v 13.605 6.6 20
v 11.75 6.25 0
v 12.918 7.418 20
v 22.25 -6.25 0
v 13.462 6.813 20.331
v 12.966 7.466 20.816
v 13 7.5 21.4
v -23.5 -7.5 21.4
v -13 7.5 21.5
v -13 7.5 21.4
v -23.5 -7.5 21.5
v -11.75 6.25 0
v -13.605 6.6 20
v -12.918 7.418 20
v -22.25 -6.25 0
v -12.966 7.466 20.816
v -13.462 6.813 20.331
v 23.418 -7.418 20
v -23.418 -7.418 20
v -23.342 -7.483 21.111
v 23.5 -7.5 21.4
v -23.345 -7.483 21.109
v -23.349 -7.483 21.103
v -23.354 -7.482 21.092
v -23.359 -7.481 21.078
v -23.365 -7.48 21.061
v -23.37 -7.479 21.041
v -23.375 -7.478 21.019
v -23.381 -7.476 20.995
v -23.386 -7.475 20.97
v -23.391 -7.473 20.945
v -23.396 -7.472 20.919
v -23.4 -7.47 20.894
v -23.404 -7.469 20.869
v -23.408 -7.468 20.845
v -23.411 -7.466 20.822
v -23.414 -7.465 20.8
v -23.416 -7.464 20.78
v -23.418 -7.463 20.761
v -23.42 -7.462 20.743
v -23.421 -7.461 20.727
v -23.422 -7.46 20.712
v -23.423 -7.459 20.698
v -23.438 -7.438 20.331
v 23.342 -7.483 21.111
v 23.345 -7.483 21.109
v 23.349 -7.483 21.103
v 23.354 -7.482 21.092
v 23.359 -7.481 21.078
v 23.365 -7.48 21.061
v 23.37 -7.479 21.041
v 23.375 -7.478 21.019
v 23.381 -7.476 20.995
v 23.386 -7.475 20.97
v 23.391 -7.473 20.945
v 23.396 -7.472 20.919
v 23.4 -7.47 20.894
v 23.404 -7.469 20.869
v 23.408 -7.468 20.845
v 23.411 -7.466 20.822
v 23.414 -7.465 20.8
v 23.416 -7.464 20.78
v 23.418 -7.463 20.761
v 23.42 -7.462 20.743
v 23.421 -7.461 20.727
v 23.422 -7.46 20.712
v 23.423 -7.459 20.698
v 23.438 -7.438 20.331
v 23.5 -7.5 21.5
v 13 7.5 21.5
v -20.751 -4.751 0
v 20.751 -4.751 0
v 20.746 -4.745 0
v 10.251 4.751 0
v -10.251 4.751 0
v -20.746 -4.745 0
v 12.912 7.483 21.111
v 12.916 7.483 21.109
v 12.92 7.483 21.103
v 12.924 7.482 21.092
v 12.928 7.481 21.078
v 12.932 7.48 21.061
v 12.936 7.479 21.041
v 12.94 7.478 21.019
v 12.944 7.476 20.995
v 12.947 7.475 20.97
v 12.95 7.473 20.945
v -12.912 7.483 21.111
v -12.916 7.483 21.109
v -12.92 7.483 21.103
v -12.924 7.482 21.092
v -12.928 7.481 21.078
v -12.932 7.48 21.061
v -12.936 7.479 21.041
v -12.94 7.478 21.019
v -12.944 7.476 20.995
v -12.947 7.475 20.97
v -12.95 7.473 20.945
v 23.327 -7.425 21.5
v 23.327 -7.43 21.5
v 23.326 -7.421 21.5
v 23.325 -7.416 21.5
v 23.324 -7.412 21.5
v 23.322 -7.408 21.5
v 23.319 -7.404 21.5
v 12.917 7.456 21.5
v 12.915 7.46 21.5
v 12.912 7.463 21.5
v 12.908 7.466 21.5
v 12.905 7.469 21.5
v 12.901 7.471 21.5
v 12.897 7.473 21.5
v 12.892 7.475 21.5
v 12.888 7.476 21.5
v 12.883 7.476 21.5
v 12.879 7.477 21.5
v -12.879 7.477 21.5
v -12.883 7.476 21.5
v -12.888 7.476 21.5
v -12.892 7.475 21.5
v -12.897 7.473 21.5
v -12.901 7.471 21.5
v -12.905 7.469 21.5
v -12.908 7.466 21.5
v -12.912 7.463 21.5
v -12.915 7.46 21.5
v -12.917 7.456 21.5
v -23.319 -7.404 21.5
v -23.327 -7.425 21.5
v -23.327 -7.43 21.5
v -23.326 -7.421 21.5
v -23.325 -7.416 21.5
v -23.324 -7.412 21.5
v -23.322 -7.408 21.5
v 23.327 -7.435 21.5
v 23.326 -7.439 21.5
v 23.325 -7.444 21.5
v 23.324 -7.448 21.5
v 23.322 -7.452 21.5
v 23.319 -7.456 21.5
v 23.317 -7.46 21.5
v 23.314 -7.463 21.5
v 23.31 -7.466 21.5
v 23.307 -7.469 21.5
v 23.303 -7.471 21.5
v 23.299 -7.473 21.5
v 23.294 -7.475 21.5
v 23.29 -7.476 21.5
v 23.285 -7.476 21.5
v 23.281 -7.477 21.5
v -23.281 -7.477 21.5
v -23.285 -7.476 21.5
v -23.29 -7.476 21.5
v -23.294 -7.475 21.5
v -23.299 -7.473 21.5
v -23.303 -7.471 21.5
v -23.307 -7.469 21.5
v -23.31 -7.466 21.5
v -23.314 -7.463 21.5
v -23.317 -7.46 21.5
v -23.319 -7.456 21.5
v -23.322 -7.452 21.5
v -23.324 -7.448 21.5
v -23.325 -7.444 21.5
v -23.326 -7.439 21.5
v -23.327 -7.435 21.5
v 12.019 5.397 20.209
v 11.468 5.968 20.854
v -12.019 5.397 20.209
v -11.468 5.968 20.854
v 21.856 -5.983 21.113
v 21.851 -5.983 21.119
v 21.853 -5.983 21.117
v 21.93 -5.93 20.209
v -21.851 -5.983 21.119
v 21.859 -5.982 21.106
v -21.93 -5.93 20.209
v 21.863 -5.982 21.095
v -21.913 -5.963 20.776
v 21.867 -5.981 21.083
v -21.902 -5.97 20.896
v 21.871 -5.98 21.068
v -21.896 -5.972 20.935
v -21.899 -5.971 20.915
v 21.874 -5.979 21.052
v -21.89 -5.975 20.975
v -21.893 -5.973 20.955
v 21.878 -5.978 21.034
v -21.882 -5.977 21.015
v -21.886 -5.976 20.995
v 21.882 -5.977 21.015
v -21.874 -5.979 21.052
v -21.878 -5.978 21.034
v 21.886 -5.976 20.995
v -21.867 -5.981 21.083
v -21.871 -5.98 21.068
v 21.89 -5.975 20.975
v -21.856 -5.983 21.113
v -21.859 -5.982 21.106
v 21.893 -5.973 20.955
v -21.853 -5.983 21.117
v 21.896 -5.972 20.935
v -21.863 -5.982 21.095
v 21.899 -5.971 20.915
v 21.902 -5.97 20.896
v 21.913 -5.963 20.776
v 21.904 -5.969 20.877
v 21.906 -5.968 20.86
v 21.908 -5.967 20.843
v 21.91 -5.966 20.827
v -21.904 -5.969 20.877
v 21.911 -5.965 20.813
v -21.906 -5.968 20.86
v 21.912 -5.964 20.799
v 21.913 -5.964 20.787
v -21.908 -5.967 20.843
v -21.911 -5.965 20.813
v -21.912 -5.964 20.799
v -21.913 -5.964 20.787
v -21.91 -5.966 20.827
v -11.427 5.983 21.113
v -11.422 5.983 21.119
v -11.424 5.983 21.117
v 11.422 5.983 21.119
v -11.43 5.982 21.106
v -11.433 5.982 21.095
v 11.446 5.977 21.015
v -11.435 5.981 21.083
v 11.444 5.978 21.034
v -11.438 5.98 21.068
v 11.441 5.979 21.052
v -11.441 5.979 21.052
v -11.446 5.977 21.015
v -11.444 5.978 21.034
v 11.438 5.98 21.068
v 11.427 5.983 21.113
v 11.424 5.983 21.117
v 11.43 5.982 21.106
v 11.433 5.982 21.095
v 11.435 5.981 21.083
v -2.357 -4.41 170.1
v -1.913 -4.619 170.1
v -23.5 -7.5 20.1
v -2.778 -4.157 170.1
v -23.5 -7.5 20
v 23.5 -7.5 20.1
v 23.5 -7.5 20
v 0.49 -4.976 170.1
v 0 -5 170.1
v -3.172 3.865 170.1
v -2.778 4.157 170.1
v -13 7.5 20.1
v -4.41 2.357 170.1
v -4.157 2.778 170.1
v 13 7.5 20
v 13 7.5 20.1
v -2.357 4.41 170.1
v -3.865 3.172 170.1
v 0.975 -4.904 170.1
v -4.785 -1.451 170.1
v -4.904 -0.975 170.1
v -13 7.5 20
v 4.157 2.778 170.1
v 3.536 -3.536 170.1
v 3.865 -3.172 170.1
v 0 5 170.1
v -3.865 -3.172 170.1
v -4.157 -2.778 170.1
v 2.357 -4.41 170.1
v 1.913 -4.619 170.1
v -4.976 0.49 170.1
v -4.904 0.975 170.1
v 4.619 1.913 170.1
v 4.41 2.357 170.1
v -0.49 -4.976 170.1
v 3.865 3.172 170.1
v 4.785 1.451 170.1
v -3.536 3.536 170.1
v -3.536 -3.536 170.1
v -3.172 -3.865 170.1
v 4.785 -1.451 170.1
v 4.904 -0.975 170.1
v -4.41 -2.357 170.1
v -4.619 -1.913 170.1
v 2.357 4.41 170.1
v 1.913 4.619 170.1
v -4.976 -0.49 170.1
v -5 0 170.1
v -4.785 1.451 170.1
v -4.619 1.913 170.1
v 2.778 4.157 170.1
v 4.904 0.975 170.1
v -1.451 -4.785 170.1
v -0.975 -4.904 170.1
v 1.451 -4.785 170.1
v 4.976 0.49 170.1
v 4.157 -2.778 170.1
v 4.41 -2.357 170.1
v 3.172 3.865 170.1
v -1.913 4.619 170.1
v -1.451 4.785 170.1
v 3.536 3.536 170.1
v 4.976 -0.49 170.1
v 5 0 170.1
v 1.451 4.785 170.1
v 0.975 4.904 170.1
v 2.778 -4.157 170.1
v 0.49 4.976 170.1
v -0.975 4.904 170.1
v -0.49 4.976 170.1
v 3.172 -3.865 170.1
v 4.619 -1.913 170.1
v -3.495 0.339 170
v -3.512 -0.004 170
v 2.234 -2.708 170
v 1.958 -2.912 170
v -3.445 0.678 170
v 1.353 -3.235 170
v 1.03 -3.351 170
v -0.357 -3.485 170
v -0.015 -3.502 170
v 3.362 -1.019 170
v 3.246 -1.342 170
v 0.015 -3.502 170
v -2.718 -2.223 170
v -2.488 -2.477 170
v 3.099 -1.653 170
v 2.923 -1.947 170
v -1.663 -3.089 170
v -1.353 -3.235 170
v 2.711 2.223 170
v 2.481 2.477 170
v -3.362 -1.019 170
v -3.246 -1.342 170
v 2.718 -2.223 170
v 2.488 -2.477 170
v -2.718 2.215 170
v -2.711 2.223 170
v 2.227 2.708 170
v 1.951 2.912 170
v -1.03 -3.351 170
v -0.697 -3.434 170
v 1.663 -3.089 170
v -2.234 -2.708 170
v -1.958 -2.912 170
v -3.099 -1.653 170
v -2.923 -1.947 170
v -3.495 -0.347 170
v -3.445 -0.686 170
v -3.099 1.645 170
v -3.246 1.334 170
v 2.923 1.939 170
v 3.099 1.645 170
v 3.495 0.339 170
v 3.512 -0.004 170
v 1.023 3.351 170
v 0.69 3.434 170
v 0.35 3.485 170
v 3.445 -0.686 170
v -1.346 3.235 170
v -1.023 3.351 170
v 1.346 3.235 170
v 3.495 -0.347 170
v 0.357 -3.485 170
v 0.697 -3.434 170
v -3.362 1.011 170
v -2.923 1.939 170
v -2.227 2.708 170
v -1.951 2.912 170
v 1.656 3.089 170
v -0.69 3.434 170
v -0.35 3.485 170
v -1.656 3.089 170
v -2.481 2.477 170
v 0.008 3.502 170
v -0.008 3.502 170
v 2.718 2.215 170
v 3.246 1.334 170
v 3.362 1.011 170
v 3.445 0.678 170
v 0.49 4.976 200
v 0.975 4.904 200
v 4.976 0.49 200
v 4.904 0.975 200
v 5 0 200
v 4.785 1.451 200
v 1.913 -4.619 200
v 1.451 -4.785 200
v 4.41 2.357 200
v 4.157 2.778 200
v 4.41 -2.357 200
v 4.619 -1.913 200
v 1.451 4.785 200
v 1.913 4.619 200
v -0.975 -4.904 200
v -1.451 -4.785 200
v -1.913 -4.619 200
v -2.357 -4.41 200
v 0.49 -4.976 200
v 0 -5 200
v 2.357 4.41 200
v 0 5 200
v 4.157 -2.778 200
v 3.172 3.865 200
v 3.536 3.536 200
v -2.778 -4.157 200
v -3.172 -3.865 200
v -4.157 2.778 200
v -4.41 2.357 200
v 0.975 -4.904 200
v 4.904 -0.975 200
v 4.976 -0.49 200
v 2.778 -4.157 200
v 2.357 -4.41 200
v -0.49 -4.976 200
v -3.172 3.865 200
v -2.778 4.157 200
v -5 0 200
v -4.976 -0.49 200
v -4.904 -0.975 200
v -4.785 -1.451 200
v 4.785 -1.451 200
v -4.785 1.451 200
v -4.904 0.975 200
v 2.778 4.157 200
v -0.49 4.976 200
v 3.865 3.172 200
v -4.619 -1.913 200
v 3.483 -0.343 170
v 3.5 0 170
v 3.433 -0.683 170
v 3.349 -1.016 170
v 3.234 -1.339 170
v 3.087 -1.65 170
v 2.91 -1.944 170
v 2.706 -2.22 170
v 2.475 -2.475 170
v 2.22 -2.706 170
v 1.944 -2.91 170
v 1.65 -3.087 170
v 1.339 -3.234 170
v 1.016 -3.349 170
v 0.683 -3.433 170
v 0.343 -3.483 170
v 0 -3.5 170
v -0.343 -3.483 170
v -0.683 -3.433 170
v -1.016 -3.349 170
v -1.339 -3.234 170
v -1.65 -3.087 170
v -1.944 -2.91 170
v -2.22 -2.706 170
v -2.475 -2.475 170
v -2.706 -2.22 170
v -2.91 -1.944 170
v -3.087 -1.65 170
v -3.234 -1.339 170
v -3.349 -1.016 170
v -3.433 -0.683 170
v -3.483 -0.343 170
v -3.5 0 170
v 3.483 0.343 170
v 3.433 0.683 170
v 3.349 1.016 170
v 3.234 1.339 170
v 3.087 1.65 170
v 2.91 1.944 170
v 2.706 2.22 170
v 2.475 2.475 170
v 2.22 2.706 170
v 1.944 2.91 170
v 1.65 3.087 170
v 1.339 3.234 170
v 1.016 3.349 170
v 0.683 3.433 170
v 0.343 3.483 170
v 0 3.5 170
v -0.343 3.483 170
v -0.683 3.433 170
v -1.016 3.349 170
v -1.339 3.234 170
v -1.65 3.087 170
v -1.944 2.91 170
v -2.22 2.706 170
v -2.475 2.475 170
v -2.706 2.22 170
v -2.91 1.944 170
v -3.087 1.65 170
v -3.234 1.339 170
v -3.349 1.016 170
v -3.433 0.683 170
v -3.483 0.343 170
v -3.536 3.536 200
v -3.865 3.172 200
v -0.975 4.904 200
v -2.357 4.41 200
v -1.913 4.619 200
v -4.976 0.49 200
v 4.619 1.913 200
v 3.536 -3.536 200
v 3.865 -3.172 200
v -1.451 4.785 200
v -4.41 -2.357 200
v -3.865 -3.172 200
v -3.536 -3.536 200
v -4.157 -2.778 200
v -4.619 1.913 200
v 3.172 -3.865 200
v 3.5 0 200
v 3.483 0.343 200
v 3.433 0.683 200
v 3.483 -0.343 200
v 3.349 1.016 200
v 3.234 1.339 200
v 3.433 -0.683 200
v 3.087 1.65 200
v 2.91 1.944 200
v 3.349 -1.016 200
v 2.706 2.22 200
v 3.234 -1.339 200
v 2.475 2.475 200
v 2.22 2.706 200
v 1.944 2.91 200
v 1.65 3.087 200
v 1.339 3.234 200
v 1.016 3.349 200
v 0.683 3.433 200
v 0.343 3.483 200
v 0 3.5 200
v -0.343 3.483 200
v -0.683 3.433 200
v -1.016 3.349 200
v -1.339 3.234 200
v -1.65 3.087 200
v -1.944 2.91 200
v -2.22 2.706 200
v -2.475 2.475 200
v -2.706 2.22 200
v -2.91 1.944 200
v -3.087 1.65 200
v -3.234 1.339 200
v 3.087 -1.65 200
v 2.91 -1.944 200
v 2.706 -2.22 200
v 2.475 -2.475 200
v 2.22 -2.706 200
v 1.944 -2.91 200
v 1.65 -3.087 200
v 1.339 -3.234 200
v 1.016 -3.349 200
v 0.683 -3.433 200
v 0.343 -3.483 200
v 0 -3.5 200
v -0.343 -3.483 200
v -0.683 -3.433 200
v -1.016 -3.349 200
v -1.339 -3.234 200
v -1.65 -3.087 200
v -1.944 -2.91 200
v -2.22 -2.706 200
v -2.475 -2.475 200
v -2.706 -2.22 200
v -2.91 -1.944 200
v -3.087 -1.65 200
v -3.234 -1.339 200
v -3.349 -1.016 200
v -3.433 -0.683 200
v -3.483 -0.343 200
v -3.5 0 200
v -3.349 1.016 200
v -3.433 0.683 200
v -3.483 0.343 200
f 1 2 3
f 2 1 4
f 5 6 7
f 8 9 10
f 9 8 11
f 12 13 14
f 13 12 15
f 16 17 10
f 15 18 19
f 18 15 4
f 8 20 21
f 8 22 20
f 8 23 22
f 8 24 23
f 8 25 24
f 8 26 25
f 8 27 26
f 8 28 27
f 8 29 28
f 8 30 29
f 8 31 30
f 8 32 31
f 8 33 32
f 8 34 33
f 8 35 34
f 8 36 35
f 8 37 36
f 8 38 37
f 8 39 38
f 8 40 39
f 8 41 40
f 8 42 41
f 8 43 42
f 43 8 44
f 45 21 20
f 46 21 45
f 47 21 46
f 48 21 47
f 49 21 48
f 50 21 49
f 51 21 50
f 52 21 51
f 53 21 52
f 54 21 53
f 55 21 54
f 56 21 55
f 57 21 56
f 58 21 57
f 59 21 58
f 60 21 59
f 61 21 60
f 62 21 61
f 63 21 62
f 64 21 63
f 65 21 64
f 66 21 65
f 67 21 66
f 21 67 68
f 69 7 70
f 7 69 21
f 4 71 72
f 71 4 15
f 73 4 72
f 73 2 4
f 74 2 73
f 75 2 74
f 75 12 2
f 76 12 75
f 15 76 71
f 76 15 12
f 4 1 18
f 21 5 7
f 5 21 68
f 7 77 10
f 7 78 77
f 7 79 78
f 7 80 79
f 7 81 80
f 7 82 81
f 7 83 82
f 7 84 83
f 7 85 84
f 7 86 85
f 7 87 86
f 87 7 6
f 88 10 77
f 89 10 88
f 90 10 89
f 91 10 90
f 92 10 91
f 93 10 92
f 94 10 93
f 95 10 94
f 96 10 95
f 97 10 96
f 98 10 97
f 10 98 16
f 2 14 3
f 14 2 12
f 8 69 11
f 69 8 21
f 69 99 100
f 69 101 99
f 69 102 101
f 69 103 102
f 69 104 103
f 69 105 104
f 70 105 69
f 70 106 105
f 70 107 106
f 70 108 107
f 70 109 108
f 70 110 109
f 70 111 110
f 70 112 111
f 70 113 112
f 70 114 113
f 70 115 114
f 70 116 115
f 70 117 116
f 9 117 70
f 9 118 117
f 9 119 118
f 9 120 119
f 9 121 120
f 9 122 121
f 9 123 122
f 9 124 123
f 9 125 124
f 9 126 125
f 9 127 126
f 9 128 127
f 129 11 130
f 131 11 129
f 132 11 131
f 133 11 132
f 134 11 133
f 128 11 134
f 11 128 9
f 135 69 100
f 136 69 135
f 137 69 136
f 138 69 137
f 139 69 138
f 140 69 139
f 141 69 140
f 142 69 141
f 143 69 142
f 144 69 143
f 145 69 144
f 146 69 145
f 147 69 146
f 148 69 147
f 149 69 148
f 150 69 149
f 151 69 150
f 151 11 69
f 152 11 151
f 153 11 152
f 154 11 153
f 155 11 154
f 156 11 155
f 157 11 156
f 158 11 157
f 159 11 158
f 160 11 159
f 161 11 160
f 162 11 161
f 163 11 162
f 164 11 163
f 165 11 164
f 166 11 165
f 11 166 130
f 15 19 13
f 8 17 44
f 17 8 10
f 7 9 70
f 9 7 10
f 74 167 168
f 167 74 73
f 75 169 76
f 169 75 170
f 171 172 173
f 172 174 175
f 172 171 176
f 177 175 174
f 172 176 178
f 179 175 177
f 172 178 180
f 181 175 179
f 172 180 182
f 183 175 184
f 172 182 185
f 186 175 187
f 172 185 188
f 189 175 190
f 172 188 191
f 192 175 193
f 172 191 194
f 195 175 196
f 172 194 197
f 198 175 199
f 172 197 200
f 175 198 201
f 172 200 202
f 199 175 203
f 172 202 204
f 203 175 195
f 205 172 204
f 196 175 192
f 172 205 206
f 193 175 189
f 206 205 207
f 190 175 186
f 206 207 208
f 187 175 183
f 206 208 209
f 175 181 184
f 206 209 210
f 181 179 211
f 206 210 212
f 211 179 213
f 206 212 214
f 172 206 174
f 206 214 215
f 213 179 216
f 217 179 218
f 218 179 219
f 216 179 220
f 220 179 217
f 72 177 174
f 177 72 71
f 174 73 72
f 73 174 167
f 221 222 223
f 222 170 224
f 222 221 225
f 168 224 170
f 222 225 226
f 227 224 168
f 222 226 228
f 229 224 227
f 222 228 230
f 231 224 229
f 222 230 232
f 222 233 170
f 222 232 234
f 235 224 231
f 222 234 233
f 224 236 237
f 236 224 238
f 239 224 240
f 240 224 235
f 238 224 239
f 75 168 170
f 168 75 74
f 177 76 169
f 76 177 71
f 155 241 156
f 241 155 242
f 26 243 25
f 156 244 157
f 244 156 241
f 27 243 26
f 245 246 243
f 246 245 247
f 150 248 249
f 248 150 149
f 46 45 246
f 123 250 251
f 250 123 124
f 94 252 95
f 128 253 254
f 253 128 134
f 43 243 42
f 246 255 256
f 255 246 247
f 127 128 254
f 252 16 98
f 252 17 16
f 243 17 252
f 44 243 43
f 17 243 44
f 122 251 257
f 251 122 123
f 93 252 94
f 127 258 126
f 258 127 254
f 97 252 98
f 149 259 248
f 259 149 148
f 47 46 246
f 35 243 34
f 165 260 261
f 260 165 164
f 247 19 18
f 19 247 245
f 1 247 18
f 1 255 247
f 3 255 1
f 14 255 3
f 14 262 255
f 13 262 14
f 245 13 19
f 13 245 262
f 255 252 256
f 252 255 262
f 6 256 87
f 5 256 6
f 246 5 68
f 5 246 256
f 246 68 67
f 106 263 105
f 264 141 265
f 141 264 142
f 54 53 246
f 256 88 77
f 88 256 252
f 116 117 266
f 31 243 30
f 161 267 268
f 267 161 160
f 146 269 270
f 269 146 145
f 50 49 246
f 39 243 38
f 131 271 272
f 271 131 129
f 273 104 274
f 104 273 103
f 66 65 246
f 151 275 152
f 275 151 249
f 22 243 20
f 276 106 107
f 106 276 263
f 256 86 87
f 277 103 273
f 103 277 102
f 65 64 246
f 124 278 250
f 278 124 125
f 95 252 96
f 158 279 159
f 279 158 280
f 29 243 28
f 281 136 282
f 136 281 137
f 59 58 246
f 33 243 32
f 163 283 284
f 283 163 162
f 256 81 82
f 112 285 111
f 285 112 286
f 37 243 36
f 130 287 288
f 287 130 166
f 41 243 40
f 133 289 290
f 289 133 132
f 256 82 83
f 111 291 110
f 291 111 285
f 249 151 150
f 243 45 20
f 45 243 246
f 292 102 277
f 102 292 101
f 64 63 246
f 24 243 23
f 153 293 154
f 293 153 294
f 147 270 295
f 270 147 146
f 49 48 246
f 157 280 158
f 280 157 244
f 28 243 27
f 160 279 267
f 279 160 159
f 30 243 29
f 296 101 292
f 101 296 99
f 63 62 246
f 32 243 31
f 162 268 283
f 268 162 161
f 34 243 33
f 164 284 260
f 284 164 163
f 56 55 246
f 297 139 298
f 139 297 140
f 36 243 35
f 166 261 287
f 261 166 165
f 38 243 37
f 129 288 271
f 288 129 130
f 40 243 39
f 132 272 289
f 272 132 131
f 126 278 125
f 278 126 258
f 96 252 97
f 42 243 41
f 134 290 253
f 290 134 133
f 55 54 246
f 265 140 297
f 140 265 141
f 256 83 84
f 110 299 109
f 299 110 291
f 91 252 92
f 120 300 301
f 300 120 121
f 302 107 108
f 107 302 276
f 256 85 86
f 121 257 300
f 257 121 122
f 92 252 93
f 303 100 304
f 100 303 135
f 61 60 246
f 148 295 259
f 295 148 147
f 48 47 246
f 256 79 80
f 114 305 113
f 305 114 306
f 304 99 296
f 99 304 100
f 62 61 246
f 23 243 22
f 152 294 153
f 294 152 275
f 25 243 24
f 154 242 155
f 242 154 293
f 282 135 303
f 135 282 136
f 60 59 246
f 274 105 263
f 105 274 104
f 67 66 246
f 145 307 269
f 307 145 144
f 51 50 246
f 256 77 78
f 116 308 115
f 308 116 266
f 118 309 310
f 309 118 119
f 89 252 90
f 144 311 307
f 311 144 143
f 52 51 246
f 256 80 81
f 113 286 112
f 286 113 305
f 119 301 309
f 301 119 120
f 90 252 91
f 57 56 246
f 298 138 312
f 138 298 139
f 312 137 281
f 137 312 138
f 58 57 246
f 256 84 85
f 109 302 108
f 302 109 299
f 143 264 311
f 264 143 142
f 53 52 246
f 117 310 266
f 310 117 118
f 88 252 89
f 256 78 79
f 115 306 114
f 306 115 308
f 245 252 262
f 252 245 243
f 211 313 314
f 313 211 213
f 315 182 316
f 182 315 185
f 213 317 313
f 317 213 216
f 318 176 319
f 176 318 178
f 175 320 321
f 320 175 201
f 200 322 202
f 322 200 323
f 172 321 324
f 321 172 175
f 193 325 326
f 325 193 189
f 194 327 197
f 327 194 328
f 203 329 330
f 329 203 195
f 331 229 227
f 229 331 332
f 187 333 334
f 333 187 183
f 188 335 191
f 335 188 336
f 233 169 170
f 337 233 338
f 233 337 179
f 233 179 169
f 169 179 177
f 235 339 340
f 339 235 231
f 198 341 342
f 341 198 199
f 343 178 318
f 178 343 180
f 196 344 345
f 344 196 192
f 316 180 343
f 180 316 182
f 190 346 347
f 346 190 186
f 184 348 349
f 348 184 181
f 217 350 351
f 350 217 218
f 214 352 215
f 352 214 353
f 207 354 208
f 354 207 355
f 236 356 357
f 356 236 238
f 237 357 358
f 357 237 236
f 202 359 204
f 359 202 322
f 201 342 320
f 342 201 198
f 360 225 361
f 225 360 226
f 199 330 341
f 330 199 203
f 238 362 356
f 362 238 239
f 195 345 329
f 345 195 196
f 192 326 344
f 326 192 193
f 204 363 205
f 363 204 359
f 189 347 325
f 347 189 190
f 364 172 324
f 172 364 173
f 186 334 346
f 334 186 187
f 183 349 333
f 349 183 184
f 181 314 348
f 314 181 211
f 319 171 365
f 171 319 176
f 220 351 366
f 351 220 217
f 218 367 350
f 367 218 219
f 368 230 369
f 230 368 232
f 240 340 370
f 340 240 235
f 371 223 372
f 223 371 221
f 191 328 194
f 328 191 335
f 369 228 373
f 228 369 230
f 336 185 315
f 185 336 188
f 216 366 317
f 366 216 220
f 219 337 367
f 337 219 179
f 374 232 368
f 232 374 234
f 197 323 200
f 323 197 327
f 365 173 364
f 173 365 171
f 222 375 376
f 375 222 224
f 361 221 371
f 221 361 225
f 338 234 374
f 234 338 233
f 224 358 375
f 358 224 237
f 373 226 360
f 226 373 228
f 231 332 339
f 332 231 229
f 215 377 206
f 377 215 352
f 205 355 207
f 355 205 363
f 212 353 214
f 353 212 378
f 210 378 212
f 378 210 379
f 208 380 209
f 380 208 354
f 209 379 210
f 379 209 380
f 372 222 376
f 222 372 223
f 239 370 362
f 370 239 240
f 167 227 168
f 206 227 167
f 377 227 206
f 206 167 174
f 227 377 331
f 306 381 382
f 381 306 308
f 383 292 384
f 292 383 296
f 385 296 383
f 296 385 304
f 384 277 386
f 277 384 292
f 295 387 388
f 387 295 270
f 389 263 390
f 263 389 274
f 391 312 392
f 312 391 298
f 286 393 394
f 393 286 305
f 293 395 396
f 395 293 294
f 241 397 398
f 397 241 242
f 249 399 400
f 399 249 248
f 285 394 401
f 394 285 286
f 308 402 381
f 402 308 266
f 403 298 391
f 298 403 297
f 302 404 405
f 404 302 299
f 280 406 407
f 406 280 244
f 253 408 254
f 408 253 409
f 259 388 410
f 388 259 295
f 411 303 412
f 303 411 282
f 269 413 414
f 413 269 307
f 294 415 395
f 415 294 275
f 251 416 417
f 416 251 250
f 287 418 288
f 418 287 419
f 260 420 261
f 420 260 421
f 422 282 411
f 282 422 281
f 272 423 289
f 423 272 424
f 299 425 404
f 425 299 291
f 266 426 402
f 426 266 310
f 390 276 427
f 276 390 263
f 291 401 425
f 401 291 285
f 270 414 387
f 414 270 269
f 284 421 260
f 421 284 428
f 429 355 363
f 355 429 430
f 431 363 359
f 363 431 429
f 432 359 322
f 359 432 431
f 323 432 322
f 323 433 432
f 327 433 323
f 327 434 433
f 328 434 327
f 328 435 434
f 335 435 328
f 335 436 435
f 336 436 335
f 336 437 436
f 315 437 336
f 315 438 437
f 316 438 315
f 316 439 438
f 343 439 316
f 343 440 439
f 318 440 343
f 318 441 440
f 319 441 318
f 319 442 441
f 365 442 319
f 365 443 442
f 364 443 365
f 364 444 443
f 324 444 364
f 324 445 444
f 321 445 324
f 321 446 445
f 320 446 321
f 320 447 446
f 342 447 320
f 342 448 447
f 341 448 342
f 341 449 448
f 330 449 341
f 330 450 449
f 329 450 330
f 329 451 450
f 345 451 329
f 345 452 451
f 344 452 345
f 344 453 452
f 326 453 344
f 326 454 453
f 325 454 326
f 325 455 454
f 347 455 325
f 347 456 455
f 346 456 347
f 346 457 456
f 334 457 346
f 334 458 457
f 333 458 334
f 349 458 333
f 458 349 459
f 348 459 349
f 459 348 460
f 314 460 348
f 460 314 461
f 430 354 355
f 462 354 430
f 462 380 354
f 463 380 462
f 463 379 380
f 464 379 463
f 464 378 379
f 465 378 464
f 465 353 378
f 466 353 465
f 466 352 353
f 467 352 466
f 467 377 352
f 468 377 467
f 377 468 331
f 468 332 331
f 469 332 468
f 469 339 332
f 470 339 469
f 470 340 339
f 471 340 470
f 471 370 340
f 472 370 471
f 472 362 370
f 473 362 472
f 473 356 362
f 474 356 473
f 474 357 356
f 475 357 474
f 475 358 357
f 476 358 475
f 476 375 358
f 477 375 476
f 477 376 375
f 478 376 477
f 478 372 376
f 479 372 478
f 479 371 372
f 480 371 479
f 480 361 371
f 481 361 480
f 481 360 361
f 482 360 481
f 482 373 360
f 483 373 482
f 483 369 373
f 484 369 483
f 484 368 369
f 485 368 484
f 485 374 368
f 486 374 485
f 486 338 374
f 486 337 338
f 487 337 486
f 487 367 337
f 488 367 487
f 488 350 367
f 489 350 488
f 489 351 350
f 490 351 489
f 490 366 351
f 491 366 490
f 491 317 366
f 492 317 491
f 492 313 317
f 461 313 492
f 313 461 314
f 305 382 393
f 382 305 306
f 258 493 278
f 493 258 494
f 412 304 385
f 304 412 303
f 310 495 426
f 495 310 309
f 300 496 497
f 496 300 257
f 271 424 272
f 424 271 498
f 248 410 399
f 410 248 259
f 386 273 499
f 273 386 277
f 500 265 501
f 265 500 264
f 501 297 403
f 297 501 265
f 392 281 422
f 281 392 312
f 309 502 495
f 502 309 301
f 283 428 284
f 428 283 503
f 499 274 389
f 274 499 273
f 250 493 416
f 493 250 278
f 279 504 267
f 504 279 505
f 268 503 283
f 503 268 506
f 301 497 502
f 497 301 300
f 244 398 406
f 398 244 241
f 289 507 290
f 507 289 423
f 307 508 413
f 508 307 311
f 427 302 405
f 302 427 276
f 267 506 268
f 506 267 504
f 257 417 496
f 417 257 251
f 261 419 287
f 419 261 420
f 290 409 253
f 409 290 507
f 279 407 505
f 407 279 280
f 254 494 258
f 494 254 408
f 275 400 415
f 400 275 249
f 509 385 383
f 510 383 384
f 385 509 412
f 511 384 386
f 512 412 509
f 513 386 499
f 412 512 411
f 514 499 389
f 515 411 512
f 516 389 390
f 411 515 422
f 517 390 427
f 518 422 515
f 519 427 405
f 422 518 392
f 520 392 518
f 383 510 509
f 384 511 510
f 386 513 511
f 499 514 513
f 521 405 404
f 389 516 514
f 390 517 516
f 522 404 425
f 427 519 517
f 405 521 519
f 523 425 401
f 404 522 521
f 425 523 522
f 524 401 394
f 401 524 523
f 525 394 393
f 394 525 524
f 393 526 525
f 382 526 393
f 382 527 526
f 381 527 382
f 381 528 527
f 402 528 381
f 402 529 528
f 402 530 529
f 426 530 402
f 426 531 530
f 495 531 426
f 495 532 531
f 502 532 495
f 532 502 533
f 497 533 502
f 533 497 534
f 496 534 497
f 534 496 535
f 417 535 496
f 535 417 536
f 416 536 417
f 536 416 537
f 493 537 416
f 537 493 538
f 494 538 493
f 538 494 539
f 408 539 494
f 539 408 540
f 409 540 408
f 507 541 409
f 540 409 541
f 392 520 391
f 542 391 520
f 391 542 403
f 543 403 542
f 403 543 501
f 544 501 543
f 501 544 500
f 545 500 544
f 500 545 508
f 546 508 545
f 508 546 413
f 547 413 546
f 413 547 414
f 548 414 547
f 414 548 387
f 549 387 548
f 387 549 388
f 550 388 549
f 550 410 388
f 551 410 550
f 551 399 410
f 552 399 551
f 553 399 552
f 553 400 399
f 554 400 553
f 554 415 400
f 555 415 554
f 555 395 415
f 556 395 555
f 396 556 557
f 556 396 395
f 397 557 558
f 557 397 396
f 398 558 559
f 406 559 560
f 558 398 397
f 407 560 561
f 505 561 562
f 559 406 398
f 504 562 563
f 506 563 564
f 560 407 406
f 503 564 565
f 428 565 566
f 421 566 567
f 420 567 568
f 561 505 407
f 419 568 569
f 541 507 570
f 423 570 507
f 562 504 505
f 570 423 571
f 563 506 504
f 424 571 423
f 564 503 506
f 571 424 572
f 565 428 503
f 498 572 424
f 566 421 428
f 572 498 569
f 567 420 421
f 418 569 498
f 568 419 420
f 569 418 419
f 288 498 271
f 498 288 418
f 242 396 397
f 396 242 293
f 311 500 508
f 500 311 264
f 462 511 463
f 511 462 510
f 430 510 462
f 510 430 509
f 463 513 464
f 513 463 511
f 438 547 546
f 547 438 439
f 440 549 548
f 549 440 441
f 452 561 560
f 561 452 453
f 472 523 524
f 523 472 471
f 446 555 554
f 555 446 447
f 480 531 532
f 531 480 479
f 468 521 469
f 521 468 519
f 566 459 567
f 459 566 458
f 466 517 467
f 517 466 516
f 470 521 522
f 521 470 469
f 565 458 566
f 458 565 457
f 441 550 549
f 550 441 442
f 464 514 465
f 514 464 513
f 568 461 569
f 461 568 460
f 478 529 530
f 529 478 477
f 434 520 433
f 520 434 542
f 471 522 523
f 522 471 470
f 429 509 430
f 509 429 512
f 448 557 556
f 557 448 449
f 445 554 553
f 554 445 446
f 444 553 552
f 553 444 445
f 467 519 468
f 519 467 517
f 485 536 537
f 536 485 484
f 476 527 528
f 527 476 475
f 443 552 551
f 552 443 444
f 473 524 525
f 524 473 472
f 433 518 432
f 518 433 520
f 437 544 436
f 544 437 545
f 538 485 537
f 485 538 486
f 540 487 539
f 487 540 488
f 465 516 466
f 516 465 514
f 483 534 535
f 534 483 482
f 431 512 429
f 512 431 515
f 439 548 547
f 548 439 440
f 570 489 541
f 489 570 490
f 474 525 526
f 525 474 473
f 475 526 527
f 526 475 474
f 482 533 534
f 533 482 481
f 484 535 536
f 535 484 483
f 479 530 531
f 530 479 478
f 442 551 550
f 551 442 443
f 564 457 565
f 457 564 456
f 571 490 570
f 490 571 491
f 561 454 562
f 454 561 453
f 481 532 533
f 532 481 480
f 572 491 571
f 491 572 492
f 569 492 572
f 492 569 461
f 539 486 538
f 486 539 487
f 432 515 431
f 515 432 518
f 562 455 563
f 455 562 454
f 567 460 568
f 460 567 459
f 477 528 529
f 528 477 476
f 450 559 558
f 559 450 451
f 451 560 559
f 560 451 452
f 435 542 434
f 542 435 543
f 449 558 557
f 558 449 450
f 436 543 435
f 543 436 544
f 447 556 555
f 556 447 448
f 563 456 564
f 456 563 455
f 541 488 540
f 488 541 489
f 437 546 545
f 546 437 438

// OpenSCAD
// RYOBI R18HV Crevice Tool Nozzle
// Designed to fit RYOBI R18HV handheld vacuum inlet
// Total length: 100mm
// Crevice tip: 10mm round

// --- PARAMETERS ---
// Adjust these values as needed
// Connector dimensions (for vacuum inlet) - These are the *external* dimensions of the vacuum's inlet.
// Our nozzle's connector will be slightly smaller to fit *into* it.
v_long_edge = 45;   // Vacuum inlet long edge
v_top_edge = 24;    // Vacuum inlet top edge
v_height = 13;      // Vacuum inlet height

// Tolerance for a snug fit. Adjust if print is too loose or tight.
// Negative value means the nozzle will be bigger than the inlet.
fit_tolerance_start = 0.5; // mm - starts 0.5mm smaller for easy insertion
fit_tolerance_end = -2.0;  // mm - ends 2mm bigger for strong wedge fit

// Nozzle Connector Dimensions at start (looser for easy insertion)
nozzle_long_edge_start = v_long_edge - fit_tolerance_start;
nozzle_top_edge_start = v_top_edge - fit_tolerance_start;
nozzle_height_start = v_height - fit_tolerance_start;

// Nozzle Connector Dimensions at end (tighter for snug fit)
nozzle_long_edge_end = v_long_edge - fit_tolerance_end;
nozzle_top_edge_end = v_top_edge - fit_tolerance_end;
nozzle_height_end = v_height - fit_tolerance_end;

// Nozzle insertion depth into the vacuum
insertion_depth = 20; // mm

// Straw tip dimensions
straw_diameter = 7; // mm
straw_wall_thickness = 1.5; // mm (Adjust for strength vs. airflow)

// Total length of the nozzle
total_length = 200; // mm

// Wall thickness for the main body of the adapter
body_wall_thickness = 1.5; // mm

// Number of facets for circular parts (higher = smoother, but larger file)
$fn = 64;

// --- MODULES ---
module trapezoid_connector_tapered(l_edge_start, t_edge_start, h_start, l_edge_end, t_edge_end, h_end, depth) {
    hull() {
        // Start face (loose fit)
        linear_extrude(height = 0.1) {
            polygon(points = [
                [-l_edge_start/2, -h_start/2],
                [l_edge_start/2, -h_start/2],
                [t_edge_start/2, h_start/2],
                [-t_edge_start/2, h_start/2]
            ]);
        }
        // End face (tight fit)
        translate([0, 0, depth - 0.1]) {
            linear_extrude(height = 0.1) {
                polygon(points = [
                    [-l_edge_end/2, -h_end/2],
                    [l_edge_end/2, -h_end/2],
                    [t_edge_end/2, h_end/2],
                    [-t_edge_end/2, h_end/2]
                ]);
            }
        }
    }
}

// --- MAIN BODY DESIGN ---
module custom_crevice_nozzle() {
    // Calculate lengths
    // The adapter section connects the trapezoid to the circular straw
    // We assume the transition happens over the remaining length after insertion_depth and some straw length
    
    // For simplicity, let's make the straw section a reasonable length at the end.
    // Let's say the straw part is 30mm long.
    straw_actual_length = 30; // Length of the final 10mm diameter straw section
    
    // The transition from trapezoid to circle
    // This is the total length minus the insertion depth and the straw's actual length
    transition_length = total_length - insertion_depth - straw_actual_length;
    
    // Ensure transition_length is not negative
    if (transition_length < 0) {
        echo("Warning: transition_length is negative. Adjust total_length, insertion_depth, or straw_actual_length.");
        transition_length = 10; // Default to a small transition if calculation fails
    }

    // --- 1. Trapezoidal Connection (Male connector that fits into vacuum inlet) ---
    // Now with taper for progressive wedge fit
    difference() {
        // Outer tapered shape
        trapezoid_connector_tapered(
            nozzle_long_edge_start, nozzle_top_edge_start, nozzle_height_start,
            nozzle_long_edge_end, nozzle_top_edge_end, nozzle_height_end,
            insertion_depth + body_wall_thickness
        );
        
        // Inner void - also tapered to maintain consistent wall thickness
        translate([0, 0, -0.01]) {
            trapezoid_connector_tapered(
                nozzle_long_edge_start - 2 * body_wall_thickness,
                nozzle_top_edge_start - 2 * body_wall_thickness,
                nozzle_height_start - 2 * body_wall_thickness,
                nozzle_long_edge_end - 2 * body_wall_thickness,
                nozzle_top_edge_end - 2 * body_wall_thickness,
                nozzle_height_end - 2 * body_wall_thickness,
                insertion_depth + body_wall_thickness + 0.02
            );
        }
    }

    // --- 2. Transition Body from Trapezoid to Circle ---
    // This connects the trapezoidal opening to the circular straw
    translate([0, 0, insertion_depth]) {
        difference() {
            hull() {
                // Start of hull (end of trapezoidal connector)
                linear_extrude(height = 0.1) { // Small height for hull start
                    polygon(points = [
                        [-(nozzle_long_edge_end/2), -(nozzle_height_end/2)],
                        [(nozzle_long_edge_end/2), -(nozzle_height_end/2)],
                        [(nozzle_top_edge_end/2), (nozzle_height_end/2)],
                        [-(nozzle_top_edge_end/2), (nozzle_height_end/2)]
                    ]);
                }
                
                // End of hull (start of circular straw)
                translate([0, 0, transition_length]) {
                    linear_extrude(height = 0.1) {
                        circle(d = straw_diameter + 2*straw_wall_thickness);
                    }
                }
            }
            
            // Inner void for the transition
            hull() {
                // Inner void start (matching the trapezoid inner dimensions)
                linear_extrude(height = 0.1) {
                    polygon(points = [
                        [-(nozzle_long_edge_end/2 - body_wall_thickness), -(nozzle_height_end/2 - body_wall_thickness)],
                        [(nozzle_long_edge_end/2 - body_wall_thickness), -(nozzle_height_end/2 - body_wall_thickness)],
                        [(nozzle_top_edge_end/2 - body_wall_thickness), (nozzle_height_end/2 - body_wall_thickness)],
                        [-(nozzle_top_edge_end/2 - body_wall_thickness), (nozzle_height_end/2 - body_wall_thickness)]
                    ]);
                }
                
                // Inner void end (circular)
                translate([0, 0, transition_length]) {
                    linear_extrude(height = 0.1) {
                        circle(d = straw_diameter);
                    }
                }
            }
        }
    }
    
    // --- 3. Straw Tip ---
    translate([0, 0, insertion_depth + transition_length]) {
        difference() {
            cylinder(d = straw_diameter + 2*straw_wall_thickness, h = straw_actual_length);
            translate([0, 0, -0.01]) { // Slight overlap to ensure clean cut
                cylinder(d = straw_diameter, h = straw_actual_length + 0.02);
            }
        }
    }
}

// Render the full nozzle
custom_crevice_nozzle();
